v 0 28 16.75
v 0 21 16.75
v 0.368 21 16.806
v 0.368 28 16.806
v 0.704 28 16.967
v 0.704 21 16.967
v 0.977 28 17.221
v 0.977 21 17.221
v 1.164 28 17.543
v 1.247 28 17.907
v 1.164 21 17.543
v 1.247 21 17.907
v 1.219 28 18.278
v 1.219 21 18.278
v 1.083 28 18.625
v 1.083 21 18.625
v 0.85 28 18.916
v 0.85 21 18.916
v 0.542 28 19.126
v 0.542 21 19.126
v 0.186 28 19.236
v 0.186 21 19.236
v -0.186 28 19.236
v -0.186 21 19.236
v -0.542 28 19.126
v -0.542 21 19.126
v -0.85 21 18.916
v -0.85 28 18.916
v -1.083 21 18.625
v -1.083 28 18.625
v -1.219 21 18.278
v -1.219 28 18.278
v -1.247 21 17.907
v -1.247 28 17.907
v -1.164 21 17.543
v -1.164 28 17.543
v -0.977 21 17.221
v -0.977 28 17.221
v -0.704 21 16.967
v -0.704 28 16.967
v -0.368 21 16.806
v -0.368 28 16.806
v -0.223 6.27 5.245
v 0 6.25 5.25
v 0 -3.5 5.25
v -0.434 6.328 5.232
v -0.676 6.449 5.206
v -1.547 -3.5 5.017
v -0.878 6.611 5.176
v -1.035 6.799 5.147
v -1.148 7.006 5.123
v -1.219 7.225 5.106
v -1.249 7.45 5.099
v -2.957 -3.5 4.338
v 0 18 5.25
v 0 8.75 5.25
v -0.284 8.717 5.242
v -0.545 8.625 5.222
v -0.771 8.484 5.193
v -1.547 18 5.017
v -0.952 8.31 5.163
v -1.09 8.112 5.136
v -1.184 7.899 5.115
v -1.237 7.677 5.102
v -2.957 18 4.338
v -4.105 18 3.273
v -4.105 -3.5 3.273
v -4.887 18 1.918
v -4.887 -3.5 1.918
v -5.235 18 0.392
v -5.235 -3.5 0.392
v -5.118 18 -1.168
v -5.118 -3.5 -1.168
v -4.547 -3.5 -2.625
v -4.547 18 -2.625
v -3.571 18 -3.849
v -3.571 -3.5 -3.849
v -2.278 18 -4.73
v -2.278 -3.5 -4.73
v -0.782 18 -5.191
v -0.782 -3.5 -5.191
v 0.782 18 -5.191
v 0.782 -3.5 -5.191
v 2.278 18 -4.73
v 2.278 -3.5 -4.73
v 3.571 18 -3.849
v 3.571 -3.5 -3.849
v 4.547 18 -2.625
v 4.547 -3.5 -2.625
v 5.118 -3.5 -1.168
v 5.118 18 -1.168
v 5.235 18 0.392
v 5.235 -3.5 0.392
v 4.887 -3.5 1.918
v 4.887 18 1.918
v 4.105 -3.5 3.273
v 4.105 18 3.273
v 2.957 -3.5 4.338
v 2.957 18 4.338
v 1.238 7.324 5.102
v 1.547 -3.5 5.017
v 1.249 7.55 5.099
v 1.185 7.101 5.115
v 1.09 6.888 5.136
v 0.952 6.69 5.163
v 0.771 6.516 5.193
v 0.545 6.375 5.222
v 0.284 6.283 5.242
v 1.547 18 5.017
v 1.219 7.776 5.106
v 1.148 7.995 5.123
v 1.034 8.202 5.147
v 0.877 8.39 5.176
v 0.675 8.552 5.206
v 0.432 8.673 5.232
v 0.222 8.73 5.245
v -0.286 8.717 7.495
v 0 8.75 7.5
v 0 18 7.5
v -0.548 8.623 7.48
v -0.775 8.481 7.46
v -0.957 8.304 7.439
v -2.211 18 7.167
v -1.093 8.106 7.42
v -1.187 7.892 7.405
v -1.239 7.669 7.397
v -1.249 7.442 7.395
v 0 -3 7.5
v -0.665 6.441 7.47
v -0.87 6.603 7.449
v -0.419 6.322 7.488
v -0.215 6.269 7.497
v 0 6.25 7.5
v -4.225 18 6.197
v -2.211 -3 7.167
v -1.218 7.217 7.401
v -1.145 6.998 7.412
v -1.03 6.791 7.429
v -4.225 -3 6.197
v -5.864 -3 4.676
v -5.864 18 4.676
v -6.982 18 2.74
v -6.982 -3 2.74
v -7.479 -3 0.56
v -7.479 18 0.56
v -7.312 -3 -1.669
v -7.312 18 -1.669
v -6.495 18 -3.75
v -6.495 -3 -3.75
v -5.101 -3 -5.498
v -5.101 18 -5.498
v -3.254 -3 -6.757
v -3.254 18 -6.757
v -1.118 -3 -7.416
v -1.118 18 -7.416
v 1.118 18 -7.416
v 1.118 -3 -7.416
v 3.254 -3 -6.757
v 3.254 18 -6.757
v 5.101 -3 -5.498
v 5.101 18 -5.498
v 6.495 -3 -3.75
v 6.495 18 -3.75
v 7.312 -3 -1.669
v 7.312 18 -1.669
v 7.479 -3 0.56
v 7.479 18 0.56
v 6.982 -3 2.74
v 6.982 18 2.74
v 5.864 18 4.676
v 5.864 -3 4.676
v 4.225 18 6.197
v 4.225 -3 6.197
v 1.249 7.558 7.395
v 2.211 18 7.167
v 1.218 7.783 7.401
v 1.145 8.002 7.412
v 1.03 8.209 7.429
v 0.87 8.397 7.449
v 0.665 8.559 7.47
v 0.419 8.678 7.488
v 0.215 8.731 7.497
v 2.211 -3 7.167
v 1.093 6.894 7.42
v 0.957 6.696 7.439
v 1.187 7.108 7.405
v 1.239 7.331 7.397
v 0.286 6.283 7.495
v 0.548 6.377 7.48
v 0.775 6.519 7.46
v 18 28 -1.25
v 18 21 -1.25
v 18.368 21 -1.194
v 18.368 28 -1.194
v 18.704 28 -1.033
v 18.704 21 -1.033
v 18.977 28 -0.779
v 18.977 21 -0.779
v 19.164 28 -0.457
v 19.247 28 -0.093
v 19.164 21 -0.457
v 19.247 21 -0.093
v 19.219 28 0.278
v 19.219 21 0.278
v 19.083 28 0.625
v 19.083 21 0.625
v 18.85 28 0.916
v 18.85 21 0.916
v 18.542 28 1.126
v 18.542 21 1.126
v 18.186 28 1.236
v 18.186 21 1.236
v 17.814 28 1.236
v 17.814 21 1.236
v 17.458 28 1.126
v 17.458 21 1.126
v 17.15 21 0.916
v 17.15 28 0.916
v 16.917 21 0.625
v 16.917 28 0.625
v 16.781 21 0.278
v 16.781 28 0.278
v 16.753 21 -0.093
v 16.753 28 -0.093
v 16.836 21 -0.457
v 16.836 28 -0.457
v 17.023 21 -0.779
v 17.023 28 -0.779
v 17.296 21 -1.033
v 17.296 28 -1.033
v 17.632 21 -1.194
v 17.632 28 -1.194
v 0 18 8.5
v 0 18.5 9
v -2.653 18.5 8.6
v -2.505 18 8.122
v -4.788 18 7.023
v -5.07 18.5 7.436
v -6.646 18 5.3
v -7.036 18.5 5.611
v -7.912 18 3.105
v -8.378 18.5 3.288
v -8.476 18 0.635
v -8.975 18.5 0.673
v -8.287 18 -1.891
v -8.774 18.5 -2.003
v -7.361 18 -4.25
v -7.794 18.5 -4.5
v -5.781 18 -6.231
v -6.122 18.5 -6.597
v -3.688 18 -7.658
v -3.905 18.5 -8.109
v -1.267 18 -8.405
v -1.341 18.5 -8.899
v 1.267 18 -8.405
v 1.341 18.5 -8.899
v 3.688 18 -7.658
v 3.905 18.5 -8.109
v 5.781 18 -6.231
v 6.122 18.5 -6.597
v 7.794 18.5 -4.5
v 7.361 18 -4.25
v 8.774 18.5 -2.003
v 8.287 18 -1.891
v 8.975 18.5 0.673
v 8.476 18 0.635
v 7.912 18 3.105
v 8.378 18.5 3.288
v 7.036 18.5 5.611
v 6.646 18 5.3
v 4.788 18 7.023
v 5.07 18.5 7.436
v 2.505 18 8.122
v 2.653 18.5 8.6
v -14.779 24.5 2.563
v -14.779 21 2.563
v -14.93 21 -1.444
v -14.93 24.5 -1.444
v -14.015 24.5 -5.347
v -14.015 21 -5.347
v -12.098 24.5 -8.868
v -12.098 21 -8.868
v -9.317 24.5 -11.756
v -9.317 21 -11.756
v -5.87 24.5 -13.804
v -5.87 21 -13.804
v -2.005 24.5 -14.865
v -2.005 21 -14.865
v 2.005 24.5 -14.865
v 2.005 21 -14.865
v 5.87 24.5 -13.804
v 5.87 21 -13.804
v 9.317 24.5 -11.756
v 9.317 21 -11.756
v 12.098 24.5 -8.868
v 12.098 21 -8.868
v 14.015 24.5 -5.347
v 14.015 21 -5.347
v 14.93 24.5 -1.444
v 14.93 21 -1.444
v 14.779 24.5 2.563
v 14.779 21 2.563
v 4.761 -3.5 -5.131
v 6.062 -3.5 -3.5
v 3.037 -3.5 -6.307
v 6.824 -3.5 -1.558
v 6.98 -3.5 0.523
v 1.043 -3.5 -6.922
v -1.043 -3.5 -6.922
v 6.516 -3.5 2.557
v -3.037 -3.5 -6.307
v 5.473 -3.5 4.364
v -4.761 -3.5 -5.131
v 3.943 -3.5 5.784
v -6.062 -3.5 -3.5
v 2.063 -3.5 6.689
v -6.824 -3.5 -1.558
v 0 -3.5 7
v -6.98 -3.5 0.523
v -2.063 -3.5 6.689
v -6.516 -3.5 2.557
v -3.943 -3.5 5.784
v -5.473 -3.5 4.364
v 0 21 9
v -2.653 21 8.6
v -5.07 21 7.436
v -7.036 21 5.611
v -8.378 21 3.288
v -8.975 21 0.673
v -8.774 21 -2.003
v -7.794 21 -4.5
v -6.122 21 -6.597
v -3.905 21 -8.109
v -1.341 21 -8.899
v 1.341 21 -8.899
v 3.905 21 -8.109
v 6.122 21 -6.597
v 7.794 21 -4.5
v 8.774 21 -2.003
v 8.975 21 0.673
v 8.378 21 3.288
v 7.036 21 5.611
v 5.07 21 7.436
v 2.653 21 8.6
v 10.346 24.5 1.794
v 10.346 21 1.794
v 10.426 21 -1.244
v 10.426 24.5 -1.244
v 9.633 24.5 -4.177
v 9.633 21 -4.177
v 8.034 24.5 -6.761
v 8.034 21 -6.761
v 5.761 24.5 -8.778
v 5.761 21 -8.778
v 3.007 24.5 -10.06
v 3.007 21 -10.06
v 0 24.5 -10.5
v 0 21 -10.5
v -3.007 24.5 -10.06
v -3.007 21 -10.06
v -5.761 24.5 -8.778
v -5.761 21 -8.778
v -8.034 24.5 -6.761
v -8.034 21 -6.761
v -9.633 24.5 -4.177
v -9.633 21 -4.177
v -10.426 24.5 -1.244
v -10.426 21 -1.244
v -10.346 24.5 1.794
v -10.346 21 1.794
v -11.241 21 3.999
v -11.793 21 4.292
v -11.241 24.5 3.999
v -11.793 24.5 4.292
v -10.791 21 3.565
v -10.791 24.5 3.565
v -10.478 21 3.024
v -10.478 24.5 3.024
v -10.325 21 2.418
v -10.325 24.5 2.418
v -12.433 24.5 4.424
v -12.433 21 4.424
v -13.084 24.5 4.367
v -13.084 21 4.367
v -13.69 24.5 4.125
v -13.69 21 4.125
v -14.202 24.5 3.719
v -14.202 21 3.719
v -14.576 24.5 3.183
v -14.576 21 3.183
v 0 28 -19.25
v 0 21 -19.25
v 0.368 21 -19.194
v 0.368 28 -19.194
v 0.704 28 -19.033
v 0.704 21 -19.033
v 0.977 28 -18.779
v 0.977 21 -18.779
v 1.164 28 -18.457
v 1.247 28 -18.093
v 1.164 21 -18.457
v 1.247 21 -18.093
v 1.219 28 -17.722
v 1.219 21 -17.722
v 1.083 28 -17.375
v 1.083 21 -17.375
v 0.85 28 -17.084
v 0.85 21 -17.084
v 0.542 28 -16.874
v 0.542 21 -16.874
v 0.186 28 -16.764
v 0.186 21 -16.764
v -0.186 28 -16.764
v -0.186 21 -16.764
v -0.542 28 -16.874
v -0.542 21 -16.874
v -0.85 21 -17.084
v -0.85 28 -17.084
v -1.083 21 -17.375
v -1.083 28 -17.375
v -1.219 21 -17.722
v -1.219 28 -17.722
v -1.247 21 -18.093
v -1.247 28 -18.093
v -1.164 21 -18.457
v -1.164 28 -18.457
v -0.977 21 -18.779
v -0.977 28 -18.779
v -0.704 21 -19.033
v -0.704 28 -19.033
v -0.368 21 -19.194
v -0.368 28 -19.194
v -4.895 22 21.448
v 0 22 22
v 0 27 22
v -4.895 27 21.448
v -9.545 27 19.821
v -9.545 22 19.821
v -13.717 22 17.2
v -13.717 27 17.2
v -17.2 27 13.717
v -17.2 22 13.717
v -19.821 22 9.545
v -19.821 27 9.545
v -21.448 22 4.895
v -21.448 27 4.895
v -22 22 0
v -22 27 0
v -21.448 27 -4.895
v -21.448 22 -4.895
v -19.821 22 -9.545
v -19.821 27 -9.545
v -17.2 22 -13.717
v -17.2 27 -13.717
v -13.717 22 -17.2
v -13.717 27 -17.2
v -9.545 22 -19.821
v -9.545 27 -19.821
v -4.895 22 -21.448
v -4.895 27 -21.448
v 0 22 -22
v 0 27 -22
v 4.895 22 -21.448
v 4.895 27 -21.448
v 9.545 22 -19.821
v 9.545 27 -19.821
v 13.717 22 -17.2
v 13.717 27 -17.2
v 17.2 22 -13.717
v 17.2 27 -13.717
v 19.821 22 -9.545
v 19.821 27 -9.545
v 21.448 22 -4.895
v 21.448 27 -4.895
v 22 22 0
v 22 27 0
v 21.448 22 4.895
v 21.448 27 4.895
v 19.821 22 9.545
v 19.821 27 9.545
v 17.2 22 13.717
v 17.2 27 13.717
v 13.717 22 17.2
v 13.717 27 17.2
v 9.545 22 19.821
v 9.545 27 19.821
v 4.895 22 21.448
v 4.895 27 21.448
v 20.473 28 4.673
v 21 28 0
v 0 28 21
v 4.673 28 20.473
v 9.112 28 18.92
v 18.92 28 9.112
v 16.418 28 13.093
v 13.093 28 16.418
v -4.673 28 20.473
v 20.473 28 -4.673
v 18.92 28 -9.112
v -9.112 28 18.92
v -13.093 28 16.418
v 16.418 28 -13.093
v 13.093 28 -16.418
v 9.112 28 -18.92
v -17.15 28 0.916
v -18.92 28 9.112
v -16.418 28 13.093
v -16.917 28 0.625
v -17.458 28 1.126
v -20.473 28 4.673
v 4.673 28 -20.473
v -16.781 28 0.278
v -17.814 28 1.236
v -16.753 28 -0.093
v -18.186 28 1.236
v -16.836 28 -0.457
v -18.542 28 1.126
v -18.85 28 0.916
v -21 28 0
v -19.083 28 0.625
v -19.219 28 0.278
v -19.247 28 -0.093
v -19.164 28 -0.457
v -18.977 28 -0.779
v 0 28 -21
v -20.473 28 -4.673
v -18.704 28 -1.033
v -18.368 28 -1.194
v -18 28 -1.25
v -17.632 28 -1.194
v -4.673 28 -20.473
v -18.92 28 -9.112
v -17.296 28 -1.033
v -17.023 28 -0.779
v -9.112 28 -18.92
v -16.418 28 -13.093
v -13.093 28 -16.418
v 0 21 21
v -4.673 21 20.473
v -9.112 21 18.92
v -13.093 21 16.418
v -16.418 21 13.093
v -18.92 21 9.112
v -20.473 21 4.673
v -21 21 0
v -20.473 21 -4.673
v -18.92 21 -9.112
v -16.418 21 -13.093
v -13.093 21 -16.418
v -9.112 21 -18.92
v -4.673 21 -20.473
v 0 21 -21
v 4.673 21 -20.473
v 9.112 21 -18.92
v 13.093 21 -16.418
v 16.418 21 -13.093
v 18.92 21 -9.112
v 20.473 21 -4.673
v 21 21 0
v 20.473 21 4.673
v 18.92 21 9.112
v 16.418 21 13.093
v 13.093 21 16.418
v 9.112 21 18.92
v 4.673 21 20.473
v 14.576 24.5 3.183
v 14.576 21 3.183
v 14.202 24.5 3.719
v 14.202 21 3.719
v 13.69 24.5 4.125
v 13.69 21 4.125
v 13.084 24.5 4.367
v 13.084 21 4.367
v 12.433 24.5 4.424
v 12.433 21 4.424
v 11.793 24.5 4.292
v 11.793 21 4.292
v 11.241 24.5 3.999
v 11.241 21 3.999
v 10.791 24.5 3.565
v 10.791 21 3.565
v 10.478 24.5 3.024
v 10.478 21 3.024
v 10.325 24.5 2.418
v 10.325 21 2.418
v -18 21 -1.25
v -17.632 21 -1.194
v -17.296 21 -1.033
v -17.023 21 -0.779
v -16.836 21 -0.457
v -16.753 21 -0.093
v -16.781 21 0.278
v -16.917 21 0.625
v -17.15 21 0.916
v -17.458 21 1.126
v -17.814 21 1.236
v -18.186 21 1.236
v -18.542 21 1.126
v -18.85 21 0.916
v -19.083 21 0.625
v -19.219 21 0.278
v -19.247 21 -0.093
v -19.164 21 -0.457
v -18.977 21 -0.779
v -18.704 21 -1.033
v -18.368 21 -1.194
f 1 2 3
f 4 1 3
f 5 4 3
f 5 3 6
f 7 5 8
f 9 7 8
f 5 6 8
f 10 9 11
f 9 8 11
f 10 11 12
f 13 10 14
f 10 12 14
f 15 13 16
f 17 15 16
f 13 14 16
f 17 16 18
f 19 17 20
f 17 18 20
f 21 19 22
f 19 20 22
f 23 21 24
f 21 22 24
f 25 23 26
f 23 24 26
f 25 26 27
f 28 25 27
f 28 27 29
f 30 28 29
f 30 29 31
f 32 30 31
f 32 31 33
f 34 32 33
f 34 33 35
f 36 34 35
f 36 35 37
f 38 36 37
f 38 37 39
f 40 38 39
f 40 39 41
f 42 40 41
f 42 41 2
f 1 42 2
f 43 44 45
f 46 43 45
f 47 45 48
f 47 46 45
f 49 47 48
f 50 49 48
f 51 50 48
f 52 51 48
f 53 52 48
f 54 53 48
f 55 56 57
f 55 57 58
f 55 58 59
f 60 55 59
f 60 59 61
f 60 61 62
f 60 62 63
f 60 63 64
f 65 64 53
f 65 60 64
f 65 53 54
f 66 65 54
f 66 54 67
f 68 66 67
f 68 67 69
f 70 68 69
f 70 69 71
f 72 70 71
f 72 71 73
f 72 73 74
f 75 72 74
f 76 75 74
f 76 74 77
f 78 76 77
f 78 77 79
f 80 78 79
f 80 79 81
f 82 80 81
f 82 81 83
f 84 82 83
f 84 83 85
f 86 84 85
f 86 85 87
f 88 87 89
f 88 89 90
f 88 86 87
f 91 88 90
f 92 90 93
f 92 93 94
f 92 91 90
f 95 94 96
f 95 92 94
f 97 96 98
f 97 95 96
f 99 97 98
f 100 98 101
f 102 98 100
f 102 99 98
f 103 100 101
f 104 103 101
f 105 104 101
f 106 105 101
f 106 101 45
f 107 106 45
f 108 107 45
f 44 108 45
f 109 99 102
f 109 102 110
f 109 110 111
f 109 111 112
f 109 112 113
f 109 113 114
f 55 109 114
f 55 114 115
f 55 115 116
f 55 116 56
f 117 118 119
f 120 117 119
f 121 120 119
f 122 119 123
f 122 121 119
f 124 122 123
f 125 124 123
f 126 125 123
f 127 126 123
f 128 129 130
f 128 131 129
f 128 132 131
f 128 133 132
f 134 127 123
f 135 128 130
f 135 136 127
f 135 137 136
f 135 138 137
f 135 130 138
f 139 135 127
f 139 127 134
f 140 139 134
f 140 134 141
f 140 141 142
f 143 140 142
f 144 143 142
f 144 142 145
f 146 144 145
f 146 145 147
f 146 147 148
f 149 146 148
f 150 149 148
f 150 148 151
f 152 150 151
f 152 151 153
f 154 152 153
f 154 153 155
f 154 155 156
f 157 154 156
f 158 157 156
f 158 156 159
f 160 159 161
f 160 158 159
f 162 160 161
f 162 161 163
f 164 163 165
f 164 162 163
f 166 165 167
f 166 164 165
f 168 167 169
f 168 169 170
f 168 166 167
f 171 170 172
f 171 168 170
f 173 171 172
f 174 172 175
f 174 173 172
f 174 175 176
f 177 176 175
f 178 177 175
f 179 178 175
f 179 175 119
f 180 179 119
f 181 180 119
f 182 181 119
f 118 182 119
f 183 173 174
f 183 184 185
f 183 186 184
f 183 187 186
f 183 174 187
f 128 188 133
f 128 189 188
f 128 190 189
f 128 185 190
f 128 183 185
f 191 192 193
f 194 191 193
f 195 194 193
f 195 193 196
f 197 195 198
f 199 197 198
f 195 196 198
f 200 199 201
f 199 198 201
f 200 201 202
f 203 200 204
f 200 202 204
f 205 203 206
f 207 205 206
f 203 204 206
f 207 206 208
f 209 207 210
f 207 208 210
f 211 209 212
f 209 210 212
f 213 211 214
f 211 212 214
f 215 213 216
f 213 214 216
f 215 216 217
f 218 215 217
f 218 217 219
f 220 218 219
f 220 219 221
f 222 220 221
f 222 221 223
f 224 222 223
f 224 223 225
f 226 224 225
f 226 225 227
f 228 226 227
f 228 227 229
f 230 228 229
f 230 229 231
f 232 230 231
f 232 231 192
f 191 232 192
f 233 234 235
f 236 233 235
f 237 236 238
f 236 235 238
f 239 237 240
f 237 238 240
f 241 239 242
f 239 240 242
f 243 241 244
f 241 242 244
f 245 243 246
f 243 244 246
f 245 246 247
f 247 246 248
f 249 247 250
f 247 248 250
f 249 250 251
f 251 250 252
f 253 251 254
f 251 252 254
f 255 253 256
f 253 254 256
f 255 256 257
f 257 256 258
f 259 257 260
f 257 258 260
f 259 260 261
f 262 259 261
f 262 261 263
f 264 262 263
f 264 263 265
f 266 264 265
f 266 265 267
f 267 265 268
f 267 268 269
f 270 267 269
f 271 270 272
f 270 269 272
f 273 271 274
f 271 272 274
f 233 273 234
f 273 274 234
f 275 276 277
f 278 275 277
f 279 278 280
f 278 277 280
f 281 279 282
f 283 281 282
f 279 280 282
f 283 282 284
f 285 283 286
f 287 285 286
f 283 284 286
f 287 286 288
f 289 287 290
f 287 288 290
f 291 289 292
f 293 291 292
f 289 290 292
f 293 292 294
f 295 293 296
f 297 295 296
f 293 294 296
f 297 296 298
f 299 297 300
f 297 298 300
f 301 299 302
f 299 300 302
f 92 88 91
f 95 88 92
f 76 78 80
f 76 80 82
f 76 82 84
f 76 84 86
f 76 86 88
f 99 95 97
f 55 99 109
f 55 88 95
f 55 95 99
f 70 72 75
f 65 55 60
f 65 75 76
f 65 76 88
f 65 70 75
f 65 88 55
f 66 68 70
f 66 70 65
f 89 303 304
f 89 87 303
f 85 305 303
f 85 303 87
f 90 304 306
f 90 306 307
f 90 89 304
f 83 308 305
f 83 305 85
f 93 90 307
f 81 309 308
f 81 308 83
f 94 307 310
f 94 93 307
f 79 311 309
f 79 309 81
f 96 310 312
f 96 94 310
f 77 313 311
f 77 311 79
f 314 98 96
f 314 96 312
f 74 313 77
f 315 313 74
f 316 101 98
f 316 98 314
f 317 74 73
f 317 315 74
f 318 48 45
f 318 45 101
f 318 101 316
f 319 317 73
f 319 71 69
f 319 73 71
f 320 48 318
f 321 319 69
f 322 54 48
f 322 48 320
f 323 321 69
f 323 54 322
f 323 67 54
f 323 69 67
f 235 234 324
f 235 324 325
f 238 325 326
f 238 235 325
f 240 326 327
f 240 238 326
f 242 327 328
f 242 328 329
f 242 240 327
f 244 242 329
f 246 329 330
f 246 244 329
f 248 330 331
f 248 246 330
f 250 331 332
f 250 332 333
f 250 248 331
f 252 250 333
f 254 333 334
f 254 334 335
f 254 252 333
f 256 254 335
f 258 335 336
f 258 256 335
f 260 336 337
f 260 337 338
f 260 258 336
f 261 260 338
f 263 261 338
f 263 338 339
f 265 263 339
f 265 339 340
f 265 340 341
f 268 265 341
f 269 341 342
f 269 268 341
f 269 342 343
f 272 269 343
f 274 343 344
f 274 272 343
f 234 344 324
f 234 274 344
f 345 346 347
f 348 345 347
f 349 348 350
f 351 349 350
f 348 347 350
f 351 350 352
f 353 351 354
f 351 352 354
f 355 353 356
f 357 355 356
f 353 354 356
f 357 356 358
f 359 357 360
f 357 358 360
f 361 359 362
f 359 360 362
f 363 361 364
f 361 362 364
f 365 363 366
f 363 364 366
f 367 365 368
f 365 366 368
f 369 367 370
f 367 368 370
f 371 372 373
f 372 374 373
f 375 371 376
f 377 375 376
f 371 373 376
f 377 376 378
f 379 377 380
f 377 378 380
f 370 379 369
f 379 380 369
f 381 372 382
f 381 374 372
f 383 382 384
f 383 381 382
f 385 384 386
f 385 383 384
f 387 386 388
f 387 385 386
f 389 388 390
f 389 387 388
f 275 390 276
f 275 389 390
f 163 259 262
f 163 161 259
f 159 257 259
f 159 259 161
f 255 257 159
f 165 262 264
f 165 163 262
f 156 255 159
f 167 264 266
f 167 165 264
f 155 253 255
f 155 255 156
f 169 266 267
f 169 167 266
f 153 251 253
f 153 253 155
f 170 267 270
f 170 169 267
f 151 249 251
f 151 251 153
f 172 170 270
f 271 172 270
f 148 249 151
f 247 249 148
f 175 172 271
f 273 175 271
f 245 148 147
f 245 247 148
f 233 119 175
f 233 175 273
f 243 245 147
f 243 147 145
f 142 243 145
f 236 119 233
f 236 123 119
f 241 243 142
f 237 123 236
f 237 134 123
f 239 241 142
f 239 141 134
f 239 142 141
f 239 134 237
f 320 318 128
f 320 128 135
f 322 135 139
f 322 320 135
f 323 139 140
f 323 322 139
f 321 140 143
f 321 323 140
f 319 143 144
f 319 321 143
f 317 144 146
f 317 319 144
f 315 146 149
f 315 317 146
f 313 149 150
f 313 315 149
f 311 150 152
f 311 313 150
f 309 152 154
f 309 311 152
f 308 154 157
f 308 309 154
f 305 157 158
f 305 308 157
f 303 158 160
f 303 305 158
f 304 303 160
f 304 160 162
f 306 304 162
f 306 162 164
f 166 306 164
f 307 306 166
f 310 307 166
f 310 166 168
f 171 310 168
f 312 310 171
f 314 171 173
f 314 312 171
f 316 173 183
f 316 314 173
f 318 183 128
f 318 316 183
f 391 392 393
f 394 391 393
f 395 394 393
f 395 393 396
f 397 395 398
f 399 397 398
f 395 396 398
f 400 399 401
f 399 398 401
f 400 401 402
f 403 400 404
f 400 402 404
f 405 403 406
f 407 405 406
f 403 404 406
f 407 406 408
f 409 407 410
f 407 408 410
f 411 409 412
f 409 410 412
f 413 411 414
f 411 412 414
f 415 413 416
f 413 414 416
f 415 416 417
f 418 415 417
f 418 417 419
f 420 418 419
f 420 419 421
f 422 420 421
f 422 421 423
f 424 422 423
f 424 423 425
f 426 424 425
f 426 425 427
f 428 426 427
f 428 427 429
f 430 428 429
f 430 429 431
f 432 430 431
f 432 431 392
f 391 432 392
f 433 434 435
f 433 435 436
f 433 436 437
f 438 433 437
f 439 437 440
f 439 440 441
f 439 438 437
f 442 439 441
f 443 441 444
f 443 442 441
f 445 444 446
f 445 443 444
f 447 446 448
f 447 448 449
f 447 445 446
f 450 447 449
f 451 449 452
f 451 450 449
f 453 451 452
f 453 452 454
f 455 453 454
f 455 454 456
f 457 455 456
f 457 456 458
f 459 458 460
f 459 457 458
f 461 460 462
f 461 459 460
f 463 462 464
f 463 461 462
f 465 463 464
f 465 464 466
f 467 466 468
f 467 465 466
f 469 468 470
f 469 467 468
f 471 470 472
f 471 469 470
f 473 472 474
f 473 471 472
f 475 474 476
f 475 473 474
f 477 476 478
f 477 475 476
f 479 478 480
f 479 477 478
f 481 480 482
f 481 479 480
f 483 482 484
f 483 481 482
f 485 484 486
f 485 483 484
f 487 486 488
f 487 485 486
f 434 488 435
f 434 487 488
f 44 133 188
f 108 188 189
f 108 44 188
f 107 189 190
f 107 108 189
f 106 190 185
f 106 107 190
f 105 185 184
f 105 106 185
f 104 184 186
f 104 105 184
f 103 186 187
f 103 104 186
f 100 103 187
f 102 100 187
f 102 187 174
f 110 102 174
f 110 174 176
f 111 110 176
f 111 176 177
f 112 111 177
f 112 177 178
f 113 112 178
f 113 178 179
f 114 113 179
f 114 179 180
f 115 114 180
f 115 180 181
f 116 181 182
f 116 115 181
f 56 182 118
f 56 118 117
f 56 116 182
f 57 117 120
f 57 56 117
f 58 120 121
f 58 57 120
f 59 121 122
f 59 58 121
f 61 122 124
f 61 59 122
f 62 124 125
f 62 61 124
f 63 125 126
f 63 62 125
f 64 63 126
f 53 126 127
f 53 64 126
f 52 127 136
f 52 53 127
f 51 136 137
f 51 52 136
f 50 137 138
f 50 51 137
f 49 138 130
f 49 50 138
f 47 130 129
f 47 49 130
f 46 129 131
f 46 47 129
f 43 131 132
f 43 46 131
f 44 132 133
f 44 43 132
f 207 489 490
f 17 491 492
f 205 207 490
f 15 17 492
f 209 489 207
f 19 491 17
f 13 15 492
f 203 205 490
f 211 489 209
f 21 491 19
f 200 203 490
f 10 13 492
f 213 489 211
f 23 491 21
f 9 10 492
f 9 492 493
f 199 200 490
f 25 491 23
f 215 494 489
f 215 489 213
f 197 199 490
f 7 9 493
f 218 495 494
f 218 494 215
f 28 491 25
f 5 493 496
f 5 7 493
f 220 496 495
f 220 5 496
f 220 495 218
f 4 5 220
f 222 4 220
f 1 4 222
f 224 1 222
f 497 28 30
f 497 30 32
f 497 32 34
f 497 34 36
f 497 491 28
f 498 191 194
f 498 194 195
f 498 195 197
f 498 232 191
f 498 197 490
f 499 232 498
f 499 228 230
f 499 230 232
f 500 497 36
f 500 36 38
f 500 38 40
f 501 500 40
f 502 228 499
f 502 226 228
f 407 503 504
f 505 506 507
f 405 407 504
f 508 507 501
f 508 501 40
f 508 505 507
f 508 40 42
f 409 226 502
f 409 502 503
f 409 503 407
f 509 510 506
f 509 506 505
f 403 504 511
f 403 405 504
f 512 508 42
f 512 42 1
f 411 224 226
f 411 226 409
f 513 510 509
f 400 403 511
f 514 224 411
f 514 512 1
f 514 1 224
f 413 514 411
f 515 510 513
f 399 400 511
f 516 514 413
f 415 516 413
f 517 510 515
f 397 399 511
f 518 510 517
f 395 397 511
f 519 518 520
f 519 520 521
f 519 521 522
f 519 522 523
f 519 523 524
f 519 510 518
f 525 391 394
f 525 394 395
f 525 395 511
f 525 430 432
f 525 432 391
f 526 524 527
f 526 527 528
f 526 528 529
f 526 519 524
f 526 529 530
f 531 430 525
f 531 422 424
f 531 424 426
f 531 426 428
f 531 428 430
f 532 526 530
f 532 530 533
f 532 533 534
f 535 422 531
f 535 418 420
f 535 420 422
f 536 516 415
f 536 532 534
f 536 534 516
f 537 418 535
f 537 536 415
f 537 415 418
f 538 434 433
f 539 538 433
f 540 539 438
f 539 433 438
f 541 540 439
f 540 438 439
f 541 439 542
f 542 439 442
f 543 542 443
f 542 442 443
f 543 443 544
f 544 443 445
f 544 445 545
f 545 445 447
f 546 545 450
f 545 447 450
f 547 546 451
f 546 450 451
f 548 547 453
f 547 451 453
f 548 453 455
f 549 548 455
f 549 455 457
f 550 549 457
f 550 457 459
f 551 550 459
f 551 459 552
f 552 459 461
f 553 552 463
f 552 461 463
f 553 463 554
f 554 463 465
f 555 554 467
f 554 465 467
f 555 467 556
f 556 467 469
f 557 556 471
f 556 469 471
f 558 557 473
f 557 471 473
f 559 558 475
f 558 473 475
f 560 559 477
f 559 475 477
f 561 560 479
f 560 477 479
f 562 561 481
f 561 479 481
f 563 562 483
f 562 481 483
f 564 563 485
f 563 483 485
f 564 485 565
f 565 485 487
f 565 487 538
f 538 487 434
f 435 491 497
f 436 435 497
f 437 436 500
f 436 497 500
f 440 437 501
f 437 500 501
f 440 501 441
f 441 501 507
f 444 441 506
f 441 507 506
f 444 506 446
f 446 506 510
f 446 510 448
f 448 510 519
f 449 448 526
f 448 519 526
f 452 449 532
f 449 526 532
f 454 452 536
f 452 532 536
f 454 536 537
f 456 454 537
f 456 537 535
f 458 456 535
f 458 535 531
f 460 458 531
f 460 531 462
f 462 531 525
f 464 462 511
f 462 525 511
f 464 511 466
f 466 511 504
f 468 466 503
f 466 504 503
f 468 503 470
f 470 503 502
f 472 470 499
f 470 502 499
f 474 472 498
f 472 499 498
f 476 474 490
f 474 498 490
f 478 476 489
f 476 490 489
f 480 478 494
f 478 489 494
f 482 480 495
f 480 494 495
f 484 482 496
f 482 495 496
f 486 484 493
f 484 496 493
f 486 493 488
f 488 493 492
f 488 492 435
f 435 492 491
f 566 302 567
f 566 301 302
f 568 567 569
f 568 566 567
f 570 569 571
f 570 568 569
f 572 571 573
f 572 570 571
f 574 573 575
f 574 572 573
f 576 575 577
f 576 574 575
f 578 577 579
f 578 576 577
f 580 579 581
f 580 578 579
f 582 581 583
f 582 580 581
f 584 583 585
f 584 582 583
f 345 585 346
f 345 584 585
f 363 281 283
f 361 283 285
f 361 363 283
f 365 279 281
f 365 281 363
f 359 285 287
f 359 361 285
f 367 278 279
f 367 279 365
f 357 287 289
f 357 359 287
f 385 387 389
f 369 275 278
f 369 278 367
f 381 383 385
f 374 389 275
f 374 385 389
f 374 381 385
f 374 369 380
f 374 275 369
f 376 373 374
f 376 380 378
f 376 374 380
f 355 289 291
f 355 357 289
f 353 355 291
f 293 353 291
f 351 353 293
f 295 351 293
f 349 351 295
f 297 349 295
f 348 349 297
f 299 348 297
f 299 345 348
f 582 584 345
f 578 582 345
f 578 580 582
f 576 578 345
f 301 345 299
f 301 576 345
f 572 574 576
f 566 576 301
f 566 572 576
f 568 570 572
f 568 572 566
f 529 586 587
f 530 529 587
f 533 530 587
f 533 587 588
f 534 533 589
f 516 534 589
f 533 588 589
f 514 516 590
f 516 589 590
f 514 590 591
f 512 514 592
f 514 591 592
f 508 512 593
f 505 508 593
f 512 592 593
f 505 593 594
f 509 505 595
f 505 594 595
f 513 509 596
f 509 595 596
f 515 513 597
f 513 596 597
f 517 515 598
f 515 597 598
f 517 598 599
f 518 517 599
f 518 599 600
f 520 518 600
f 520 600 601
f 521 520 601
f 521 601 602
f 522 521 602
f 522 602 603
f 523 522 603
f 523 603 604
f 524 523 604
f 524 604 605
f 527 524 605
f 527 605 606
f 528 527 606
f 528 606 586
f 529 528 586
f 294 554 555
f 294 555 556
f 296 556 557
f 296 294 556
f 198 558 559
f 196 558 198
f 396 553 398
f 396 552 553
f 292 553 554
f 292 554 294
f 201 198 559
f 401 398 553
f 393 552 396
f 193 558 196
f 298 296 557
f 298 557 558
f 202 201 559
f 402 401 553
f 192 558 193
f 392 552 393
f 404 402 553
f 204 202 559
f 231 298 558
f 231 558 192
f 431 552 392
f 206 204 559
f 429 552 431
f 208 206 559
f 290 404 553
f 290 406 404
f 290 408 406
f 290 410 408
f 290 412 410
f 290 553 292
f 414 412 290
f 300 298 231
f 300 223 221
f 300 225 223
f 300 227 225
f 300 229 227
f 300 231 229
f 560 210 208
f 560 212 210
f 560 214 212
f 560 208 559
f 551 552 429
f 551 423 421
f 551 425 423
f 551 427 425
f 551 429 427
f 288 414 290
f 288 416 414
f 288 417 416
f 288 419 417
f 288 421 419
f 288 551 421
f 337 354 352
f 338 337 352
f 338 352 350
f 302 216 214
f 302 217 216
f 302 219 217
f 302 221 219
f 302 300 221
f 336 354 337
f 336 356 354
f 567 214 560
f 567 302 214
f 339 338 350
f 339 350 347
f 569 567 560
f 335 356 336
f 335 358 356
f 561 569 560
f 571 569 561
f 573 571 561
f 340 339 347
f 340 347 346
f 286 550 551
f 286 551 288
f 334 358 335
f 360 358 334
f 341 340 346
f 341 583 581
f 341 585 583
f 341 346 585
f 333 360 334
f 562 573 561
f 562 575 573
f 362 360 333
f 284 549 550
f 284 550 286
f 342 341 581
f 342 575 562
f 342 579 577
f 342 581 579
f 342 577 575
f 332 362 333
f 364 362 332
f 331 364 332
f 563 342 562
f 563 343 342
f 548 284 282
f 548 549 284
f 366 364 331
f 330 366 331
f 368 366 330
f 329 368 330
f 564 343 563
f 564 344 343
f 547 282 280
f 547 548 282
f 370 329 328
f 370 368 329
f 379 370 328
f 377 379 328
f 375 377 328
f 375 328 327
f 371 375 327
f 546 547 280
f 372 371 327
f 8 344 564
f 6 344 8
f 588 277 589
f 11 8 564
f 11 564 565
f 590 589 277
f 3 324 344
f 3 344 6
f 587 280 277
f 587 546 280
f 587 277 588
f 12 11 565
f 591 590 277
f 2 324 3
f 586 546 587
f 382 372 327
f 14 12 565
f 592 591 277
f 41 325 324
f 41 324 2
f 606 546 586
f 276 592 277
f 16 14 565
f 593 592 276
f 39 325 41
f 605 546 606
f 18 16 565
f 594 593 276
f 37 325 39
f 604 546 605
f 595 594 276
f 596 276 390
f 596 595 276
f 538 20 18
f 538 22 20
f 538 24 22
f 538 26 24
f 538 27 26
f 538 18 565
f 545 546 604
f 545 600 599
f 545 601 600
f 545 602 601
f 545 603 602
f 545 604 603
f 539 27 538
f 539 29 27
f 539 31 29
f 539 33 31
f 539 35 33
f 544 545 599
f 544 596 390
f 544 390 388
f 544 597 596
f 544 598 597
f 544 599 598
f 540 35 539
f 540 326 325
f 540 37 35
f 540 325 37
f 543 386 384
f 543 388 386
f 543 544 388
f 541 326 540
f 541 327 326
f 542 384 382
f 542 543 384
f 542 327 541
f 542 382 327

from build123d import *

# Parameters (mm, degrees)
SKETCH_5_R             = 7.5
SKETCH_5_R_2           = 5.25
EXTRUDE_1_DEPTH        = 3.5
SKETCH_6_R             = 1.25
CUT_EXTRUDE_M3_1_DEPTH = 42.856899073
CHAMFER_1_SIZE         = 0.5
CHAMFER_2_SIZE         = 1
CUT_EXTRUDE_14_DEPTH   = 3.5
FILLET_2_R             = 2.25
HOLE_WIZARD_M3_1_D     = 2.5


with BuildPart() as part:
    # 草图1 → 旋转1 (revolve)
    with BuildSketch(Plane(origin=(0, 0, 0), x_dir=(0, 0, -1), z_dir=(1, 0, 0))):
        Polygon((-7.5, 0), (-5.25, 0), (-5.25, 18), (0, 18), (0, 28), (-22, 28), (-22, 21), (-9, 21), (-9, 18), (-7.5, 18), align=None)
    revolve(axis=Axis((0, 28, 0), (0, -1, 0)))

    # 草图5 → 凸台-拉伸1 (add)
    with BuildSketch(Plane.XZ):
        with Locations(Location((0, 0, 0), (0, 0, 90))):
            Circle(SKETCH_5_R)
        with Locations(Location((0, 0, 0), (0, 0, 90))):
            Circle(SKETCH_5_R_2, mode=Mode.SUBTRACT)
    extrude(amount=EXTRUDE_1_DEPTH)

    # 草图6 → M3螺纹孔1 (cut, through all)
    with BuildSketch(Plane.XY):
        with Locations(Location((0, 7.5, 0), (0, 0, 270))):
            Circle(SKETCH_6_R)
    extrude(amount=CUT_EXTRUDE_M3_1_DEPTH, mode=Mode.SUBTRACT)

    # 倒角1
    chamfer_1_edges = [part.edges().sort_by_distance(p)[0] for p in [
        (0, -3.5, -7.5),
        (0, 18, -9),
    ]]
    chamfer(chamfer_1_edges, length=CHAMFER_1_SIZE)

    # 倒角2
    chamfer_2_edges = [part.edges().sort_by_distance(p)[0] for p in [
        (0, 28, -22),
        (0, 21, -22),
    ]]
    chamfer(chamfer_2_edges, length=CHAMFER_2_SIZE)

    # 草图8 → 切除-拉伸14 (cut)
    with BuildSketch(Plane.XZ.offset(-21)):
        with BuildLine():
            Line((-9.866772518, 3.591211505), (-14.095389312, 5.13030215))
            ThreePointArc((-14.095389312, 5.13030215), (0, -15), (14.095389312, 5.13030215))
            Line((14.095389312, 5.13030215), (9.866772518, 3.591211505))
            ThreePointArc((9.866772518, 3.591211505), (0, -10.5), (-9.866772518, 3.591211505))
        make_face()
    extrude(amount=-CUT_EXTRUDE_14_DEPTH, mode=Mode.SUBTRACT)

    # 圆角2
    fillet_2_edges = [part.edges().sort_by_distance(p)[0] for p in [
        (9.866772518, 22.75, 3.591211505),
        (14.095389312, 22.75, 5.13030215),
        (-9.866772518, 22.75, 3.591211505),
        (-14.095389312, 22.75, 5.13030215),
    ]]
    fillet(fillet_2_edges, radius=FILLET_2_R - 0.0001)  # a hair under: the kernel refuses the full size

    # M3 螺纹孔1 (through all)
    with Locations(Plane(origin=(0, 28, -18), x_dir=(0, 0, 1), z_dir=(0, 1, 0))):
        with Locations((0, 0), (18, 18), (36, 0), (18, -18)):
            Hole(HOLE_WIZARD_M3_1_D / 2)


solid = part.part
